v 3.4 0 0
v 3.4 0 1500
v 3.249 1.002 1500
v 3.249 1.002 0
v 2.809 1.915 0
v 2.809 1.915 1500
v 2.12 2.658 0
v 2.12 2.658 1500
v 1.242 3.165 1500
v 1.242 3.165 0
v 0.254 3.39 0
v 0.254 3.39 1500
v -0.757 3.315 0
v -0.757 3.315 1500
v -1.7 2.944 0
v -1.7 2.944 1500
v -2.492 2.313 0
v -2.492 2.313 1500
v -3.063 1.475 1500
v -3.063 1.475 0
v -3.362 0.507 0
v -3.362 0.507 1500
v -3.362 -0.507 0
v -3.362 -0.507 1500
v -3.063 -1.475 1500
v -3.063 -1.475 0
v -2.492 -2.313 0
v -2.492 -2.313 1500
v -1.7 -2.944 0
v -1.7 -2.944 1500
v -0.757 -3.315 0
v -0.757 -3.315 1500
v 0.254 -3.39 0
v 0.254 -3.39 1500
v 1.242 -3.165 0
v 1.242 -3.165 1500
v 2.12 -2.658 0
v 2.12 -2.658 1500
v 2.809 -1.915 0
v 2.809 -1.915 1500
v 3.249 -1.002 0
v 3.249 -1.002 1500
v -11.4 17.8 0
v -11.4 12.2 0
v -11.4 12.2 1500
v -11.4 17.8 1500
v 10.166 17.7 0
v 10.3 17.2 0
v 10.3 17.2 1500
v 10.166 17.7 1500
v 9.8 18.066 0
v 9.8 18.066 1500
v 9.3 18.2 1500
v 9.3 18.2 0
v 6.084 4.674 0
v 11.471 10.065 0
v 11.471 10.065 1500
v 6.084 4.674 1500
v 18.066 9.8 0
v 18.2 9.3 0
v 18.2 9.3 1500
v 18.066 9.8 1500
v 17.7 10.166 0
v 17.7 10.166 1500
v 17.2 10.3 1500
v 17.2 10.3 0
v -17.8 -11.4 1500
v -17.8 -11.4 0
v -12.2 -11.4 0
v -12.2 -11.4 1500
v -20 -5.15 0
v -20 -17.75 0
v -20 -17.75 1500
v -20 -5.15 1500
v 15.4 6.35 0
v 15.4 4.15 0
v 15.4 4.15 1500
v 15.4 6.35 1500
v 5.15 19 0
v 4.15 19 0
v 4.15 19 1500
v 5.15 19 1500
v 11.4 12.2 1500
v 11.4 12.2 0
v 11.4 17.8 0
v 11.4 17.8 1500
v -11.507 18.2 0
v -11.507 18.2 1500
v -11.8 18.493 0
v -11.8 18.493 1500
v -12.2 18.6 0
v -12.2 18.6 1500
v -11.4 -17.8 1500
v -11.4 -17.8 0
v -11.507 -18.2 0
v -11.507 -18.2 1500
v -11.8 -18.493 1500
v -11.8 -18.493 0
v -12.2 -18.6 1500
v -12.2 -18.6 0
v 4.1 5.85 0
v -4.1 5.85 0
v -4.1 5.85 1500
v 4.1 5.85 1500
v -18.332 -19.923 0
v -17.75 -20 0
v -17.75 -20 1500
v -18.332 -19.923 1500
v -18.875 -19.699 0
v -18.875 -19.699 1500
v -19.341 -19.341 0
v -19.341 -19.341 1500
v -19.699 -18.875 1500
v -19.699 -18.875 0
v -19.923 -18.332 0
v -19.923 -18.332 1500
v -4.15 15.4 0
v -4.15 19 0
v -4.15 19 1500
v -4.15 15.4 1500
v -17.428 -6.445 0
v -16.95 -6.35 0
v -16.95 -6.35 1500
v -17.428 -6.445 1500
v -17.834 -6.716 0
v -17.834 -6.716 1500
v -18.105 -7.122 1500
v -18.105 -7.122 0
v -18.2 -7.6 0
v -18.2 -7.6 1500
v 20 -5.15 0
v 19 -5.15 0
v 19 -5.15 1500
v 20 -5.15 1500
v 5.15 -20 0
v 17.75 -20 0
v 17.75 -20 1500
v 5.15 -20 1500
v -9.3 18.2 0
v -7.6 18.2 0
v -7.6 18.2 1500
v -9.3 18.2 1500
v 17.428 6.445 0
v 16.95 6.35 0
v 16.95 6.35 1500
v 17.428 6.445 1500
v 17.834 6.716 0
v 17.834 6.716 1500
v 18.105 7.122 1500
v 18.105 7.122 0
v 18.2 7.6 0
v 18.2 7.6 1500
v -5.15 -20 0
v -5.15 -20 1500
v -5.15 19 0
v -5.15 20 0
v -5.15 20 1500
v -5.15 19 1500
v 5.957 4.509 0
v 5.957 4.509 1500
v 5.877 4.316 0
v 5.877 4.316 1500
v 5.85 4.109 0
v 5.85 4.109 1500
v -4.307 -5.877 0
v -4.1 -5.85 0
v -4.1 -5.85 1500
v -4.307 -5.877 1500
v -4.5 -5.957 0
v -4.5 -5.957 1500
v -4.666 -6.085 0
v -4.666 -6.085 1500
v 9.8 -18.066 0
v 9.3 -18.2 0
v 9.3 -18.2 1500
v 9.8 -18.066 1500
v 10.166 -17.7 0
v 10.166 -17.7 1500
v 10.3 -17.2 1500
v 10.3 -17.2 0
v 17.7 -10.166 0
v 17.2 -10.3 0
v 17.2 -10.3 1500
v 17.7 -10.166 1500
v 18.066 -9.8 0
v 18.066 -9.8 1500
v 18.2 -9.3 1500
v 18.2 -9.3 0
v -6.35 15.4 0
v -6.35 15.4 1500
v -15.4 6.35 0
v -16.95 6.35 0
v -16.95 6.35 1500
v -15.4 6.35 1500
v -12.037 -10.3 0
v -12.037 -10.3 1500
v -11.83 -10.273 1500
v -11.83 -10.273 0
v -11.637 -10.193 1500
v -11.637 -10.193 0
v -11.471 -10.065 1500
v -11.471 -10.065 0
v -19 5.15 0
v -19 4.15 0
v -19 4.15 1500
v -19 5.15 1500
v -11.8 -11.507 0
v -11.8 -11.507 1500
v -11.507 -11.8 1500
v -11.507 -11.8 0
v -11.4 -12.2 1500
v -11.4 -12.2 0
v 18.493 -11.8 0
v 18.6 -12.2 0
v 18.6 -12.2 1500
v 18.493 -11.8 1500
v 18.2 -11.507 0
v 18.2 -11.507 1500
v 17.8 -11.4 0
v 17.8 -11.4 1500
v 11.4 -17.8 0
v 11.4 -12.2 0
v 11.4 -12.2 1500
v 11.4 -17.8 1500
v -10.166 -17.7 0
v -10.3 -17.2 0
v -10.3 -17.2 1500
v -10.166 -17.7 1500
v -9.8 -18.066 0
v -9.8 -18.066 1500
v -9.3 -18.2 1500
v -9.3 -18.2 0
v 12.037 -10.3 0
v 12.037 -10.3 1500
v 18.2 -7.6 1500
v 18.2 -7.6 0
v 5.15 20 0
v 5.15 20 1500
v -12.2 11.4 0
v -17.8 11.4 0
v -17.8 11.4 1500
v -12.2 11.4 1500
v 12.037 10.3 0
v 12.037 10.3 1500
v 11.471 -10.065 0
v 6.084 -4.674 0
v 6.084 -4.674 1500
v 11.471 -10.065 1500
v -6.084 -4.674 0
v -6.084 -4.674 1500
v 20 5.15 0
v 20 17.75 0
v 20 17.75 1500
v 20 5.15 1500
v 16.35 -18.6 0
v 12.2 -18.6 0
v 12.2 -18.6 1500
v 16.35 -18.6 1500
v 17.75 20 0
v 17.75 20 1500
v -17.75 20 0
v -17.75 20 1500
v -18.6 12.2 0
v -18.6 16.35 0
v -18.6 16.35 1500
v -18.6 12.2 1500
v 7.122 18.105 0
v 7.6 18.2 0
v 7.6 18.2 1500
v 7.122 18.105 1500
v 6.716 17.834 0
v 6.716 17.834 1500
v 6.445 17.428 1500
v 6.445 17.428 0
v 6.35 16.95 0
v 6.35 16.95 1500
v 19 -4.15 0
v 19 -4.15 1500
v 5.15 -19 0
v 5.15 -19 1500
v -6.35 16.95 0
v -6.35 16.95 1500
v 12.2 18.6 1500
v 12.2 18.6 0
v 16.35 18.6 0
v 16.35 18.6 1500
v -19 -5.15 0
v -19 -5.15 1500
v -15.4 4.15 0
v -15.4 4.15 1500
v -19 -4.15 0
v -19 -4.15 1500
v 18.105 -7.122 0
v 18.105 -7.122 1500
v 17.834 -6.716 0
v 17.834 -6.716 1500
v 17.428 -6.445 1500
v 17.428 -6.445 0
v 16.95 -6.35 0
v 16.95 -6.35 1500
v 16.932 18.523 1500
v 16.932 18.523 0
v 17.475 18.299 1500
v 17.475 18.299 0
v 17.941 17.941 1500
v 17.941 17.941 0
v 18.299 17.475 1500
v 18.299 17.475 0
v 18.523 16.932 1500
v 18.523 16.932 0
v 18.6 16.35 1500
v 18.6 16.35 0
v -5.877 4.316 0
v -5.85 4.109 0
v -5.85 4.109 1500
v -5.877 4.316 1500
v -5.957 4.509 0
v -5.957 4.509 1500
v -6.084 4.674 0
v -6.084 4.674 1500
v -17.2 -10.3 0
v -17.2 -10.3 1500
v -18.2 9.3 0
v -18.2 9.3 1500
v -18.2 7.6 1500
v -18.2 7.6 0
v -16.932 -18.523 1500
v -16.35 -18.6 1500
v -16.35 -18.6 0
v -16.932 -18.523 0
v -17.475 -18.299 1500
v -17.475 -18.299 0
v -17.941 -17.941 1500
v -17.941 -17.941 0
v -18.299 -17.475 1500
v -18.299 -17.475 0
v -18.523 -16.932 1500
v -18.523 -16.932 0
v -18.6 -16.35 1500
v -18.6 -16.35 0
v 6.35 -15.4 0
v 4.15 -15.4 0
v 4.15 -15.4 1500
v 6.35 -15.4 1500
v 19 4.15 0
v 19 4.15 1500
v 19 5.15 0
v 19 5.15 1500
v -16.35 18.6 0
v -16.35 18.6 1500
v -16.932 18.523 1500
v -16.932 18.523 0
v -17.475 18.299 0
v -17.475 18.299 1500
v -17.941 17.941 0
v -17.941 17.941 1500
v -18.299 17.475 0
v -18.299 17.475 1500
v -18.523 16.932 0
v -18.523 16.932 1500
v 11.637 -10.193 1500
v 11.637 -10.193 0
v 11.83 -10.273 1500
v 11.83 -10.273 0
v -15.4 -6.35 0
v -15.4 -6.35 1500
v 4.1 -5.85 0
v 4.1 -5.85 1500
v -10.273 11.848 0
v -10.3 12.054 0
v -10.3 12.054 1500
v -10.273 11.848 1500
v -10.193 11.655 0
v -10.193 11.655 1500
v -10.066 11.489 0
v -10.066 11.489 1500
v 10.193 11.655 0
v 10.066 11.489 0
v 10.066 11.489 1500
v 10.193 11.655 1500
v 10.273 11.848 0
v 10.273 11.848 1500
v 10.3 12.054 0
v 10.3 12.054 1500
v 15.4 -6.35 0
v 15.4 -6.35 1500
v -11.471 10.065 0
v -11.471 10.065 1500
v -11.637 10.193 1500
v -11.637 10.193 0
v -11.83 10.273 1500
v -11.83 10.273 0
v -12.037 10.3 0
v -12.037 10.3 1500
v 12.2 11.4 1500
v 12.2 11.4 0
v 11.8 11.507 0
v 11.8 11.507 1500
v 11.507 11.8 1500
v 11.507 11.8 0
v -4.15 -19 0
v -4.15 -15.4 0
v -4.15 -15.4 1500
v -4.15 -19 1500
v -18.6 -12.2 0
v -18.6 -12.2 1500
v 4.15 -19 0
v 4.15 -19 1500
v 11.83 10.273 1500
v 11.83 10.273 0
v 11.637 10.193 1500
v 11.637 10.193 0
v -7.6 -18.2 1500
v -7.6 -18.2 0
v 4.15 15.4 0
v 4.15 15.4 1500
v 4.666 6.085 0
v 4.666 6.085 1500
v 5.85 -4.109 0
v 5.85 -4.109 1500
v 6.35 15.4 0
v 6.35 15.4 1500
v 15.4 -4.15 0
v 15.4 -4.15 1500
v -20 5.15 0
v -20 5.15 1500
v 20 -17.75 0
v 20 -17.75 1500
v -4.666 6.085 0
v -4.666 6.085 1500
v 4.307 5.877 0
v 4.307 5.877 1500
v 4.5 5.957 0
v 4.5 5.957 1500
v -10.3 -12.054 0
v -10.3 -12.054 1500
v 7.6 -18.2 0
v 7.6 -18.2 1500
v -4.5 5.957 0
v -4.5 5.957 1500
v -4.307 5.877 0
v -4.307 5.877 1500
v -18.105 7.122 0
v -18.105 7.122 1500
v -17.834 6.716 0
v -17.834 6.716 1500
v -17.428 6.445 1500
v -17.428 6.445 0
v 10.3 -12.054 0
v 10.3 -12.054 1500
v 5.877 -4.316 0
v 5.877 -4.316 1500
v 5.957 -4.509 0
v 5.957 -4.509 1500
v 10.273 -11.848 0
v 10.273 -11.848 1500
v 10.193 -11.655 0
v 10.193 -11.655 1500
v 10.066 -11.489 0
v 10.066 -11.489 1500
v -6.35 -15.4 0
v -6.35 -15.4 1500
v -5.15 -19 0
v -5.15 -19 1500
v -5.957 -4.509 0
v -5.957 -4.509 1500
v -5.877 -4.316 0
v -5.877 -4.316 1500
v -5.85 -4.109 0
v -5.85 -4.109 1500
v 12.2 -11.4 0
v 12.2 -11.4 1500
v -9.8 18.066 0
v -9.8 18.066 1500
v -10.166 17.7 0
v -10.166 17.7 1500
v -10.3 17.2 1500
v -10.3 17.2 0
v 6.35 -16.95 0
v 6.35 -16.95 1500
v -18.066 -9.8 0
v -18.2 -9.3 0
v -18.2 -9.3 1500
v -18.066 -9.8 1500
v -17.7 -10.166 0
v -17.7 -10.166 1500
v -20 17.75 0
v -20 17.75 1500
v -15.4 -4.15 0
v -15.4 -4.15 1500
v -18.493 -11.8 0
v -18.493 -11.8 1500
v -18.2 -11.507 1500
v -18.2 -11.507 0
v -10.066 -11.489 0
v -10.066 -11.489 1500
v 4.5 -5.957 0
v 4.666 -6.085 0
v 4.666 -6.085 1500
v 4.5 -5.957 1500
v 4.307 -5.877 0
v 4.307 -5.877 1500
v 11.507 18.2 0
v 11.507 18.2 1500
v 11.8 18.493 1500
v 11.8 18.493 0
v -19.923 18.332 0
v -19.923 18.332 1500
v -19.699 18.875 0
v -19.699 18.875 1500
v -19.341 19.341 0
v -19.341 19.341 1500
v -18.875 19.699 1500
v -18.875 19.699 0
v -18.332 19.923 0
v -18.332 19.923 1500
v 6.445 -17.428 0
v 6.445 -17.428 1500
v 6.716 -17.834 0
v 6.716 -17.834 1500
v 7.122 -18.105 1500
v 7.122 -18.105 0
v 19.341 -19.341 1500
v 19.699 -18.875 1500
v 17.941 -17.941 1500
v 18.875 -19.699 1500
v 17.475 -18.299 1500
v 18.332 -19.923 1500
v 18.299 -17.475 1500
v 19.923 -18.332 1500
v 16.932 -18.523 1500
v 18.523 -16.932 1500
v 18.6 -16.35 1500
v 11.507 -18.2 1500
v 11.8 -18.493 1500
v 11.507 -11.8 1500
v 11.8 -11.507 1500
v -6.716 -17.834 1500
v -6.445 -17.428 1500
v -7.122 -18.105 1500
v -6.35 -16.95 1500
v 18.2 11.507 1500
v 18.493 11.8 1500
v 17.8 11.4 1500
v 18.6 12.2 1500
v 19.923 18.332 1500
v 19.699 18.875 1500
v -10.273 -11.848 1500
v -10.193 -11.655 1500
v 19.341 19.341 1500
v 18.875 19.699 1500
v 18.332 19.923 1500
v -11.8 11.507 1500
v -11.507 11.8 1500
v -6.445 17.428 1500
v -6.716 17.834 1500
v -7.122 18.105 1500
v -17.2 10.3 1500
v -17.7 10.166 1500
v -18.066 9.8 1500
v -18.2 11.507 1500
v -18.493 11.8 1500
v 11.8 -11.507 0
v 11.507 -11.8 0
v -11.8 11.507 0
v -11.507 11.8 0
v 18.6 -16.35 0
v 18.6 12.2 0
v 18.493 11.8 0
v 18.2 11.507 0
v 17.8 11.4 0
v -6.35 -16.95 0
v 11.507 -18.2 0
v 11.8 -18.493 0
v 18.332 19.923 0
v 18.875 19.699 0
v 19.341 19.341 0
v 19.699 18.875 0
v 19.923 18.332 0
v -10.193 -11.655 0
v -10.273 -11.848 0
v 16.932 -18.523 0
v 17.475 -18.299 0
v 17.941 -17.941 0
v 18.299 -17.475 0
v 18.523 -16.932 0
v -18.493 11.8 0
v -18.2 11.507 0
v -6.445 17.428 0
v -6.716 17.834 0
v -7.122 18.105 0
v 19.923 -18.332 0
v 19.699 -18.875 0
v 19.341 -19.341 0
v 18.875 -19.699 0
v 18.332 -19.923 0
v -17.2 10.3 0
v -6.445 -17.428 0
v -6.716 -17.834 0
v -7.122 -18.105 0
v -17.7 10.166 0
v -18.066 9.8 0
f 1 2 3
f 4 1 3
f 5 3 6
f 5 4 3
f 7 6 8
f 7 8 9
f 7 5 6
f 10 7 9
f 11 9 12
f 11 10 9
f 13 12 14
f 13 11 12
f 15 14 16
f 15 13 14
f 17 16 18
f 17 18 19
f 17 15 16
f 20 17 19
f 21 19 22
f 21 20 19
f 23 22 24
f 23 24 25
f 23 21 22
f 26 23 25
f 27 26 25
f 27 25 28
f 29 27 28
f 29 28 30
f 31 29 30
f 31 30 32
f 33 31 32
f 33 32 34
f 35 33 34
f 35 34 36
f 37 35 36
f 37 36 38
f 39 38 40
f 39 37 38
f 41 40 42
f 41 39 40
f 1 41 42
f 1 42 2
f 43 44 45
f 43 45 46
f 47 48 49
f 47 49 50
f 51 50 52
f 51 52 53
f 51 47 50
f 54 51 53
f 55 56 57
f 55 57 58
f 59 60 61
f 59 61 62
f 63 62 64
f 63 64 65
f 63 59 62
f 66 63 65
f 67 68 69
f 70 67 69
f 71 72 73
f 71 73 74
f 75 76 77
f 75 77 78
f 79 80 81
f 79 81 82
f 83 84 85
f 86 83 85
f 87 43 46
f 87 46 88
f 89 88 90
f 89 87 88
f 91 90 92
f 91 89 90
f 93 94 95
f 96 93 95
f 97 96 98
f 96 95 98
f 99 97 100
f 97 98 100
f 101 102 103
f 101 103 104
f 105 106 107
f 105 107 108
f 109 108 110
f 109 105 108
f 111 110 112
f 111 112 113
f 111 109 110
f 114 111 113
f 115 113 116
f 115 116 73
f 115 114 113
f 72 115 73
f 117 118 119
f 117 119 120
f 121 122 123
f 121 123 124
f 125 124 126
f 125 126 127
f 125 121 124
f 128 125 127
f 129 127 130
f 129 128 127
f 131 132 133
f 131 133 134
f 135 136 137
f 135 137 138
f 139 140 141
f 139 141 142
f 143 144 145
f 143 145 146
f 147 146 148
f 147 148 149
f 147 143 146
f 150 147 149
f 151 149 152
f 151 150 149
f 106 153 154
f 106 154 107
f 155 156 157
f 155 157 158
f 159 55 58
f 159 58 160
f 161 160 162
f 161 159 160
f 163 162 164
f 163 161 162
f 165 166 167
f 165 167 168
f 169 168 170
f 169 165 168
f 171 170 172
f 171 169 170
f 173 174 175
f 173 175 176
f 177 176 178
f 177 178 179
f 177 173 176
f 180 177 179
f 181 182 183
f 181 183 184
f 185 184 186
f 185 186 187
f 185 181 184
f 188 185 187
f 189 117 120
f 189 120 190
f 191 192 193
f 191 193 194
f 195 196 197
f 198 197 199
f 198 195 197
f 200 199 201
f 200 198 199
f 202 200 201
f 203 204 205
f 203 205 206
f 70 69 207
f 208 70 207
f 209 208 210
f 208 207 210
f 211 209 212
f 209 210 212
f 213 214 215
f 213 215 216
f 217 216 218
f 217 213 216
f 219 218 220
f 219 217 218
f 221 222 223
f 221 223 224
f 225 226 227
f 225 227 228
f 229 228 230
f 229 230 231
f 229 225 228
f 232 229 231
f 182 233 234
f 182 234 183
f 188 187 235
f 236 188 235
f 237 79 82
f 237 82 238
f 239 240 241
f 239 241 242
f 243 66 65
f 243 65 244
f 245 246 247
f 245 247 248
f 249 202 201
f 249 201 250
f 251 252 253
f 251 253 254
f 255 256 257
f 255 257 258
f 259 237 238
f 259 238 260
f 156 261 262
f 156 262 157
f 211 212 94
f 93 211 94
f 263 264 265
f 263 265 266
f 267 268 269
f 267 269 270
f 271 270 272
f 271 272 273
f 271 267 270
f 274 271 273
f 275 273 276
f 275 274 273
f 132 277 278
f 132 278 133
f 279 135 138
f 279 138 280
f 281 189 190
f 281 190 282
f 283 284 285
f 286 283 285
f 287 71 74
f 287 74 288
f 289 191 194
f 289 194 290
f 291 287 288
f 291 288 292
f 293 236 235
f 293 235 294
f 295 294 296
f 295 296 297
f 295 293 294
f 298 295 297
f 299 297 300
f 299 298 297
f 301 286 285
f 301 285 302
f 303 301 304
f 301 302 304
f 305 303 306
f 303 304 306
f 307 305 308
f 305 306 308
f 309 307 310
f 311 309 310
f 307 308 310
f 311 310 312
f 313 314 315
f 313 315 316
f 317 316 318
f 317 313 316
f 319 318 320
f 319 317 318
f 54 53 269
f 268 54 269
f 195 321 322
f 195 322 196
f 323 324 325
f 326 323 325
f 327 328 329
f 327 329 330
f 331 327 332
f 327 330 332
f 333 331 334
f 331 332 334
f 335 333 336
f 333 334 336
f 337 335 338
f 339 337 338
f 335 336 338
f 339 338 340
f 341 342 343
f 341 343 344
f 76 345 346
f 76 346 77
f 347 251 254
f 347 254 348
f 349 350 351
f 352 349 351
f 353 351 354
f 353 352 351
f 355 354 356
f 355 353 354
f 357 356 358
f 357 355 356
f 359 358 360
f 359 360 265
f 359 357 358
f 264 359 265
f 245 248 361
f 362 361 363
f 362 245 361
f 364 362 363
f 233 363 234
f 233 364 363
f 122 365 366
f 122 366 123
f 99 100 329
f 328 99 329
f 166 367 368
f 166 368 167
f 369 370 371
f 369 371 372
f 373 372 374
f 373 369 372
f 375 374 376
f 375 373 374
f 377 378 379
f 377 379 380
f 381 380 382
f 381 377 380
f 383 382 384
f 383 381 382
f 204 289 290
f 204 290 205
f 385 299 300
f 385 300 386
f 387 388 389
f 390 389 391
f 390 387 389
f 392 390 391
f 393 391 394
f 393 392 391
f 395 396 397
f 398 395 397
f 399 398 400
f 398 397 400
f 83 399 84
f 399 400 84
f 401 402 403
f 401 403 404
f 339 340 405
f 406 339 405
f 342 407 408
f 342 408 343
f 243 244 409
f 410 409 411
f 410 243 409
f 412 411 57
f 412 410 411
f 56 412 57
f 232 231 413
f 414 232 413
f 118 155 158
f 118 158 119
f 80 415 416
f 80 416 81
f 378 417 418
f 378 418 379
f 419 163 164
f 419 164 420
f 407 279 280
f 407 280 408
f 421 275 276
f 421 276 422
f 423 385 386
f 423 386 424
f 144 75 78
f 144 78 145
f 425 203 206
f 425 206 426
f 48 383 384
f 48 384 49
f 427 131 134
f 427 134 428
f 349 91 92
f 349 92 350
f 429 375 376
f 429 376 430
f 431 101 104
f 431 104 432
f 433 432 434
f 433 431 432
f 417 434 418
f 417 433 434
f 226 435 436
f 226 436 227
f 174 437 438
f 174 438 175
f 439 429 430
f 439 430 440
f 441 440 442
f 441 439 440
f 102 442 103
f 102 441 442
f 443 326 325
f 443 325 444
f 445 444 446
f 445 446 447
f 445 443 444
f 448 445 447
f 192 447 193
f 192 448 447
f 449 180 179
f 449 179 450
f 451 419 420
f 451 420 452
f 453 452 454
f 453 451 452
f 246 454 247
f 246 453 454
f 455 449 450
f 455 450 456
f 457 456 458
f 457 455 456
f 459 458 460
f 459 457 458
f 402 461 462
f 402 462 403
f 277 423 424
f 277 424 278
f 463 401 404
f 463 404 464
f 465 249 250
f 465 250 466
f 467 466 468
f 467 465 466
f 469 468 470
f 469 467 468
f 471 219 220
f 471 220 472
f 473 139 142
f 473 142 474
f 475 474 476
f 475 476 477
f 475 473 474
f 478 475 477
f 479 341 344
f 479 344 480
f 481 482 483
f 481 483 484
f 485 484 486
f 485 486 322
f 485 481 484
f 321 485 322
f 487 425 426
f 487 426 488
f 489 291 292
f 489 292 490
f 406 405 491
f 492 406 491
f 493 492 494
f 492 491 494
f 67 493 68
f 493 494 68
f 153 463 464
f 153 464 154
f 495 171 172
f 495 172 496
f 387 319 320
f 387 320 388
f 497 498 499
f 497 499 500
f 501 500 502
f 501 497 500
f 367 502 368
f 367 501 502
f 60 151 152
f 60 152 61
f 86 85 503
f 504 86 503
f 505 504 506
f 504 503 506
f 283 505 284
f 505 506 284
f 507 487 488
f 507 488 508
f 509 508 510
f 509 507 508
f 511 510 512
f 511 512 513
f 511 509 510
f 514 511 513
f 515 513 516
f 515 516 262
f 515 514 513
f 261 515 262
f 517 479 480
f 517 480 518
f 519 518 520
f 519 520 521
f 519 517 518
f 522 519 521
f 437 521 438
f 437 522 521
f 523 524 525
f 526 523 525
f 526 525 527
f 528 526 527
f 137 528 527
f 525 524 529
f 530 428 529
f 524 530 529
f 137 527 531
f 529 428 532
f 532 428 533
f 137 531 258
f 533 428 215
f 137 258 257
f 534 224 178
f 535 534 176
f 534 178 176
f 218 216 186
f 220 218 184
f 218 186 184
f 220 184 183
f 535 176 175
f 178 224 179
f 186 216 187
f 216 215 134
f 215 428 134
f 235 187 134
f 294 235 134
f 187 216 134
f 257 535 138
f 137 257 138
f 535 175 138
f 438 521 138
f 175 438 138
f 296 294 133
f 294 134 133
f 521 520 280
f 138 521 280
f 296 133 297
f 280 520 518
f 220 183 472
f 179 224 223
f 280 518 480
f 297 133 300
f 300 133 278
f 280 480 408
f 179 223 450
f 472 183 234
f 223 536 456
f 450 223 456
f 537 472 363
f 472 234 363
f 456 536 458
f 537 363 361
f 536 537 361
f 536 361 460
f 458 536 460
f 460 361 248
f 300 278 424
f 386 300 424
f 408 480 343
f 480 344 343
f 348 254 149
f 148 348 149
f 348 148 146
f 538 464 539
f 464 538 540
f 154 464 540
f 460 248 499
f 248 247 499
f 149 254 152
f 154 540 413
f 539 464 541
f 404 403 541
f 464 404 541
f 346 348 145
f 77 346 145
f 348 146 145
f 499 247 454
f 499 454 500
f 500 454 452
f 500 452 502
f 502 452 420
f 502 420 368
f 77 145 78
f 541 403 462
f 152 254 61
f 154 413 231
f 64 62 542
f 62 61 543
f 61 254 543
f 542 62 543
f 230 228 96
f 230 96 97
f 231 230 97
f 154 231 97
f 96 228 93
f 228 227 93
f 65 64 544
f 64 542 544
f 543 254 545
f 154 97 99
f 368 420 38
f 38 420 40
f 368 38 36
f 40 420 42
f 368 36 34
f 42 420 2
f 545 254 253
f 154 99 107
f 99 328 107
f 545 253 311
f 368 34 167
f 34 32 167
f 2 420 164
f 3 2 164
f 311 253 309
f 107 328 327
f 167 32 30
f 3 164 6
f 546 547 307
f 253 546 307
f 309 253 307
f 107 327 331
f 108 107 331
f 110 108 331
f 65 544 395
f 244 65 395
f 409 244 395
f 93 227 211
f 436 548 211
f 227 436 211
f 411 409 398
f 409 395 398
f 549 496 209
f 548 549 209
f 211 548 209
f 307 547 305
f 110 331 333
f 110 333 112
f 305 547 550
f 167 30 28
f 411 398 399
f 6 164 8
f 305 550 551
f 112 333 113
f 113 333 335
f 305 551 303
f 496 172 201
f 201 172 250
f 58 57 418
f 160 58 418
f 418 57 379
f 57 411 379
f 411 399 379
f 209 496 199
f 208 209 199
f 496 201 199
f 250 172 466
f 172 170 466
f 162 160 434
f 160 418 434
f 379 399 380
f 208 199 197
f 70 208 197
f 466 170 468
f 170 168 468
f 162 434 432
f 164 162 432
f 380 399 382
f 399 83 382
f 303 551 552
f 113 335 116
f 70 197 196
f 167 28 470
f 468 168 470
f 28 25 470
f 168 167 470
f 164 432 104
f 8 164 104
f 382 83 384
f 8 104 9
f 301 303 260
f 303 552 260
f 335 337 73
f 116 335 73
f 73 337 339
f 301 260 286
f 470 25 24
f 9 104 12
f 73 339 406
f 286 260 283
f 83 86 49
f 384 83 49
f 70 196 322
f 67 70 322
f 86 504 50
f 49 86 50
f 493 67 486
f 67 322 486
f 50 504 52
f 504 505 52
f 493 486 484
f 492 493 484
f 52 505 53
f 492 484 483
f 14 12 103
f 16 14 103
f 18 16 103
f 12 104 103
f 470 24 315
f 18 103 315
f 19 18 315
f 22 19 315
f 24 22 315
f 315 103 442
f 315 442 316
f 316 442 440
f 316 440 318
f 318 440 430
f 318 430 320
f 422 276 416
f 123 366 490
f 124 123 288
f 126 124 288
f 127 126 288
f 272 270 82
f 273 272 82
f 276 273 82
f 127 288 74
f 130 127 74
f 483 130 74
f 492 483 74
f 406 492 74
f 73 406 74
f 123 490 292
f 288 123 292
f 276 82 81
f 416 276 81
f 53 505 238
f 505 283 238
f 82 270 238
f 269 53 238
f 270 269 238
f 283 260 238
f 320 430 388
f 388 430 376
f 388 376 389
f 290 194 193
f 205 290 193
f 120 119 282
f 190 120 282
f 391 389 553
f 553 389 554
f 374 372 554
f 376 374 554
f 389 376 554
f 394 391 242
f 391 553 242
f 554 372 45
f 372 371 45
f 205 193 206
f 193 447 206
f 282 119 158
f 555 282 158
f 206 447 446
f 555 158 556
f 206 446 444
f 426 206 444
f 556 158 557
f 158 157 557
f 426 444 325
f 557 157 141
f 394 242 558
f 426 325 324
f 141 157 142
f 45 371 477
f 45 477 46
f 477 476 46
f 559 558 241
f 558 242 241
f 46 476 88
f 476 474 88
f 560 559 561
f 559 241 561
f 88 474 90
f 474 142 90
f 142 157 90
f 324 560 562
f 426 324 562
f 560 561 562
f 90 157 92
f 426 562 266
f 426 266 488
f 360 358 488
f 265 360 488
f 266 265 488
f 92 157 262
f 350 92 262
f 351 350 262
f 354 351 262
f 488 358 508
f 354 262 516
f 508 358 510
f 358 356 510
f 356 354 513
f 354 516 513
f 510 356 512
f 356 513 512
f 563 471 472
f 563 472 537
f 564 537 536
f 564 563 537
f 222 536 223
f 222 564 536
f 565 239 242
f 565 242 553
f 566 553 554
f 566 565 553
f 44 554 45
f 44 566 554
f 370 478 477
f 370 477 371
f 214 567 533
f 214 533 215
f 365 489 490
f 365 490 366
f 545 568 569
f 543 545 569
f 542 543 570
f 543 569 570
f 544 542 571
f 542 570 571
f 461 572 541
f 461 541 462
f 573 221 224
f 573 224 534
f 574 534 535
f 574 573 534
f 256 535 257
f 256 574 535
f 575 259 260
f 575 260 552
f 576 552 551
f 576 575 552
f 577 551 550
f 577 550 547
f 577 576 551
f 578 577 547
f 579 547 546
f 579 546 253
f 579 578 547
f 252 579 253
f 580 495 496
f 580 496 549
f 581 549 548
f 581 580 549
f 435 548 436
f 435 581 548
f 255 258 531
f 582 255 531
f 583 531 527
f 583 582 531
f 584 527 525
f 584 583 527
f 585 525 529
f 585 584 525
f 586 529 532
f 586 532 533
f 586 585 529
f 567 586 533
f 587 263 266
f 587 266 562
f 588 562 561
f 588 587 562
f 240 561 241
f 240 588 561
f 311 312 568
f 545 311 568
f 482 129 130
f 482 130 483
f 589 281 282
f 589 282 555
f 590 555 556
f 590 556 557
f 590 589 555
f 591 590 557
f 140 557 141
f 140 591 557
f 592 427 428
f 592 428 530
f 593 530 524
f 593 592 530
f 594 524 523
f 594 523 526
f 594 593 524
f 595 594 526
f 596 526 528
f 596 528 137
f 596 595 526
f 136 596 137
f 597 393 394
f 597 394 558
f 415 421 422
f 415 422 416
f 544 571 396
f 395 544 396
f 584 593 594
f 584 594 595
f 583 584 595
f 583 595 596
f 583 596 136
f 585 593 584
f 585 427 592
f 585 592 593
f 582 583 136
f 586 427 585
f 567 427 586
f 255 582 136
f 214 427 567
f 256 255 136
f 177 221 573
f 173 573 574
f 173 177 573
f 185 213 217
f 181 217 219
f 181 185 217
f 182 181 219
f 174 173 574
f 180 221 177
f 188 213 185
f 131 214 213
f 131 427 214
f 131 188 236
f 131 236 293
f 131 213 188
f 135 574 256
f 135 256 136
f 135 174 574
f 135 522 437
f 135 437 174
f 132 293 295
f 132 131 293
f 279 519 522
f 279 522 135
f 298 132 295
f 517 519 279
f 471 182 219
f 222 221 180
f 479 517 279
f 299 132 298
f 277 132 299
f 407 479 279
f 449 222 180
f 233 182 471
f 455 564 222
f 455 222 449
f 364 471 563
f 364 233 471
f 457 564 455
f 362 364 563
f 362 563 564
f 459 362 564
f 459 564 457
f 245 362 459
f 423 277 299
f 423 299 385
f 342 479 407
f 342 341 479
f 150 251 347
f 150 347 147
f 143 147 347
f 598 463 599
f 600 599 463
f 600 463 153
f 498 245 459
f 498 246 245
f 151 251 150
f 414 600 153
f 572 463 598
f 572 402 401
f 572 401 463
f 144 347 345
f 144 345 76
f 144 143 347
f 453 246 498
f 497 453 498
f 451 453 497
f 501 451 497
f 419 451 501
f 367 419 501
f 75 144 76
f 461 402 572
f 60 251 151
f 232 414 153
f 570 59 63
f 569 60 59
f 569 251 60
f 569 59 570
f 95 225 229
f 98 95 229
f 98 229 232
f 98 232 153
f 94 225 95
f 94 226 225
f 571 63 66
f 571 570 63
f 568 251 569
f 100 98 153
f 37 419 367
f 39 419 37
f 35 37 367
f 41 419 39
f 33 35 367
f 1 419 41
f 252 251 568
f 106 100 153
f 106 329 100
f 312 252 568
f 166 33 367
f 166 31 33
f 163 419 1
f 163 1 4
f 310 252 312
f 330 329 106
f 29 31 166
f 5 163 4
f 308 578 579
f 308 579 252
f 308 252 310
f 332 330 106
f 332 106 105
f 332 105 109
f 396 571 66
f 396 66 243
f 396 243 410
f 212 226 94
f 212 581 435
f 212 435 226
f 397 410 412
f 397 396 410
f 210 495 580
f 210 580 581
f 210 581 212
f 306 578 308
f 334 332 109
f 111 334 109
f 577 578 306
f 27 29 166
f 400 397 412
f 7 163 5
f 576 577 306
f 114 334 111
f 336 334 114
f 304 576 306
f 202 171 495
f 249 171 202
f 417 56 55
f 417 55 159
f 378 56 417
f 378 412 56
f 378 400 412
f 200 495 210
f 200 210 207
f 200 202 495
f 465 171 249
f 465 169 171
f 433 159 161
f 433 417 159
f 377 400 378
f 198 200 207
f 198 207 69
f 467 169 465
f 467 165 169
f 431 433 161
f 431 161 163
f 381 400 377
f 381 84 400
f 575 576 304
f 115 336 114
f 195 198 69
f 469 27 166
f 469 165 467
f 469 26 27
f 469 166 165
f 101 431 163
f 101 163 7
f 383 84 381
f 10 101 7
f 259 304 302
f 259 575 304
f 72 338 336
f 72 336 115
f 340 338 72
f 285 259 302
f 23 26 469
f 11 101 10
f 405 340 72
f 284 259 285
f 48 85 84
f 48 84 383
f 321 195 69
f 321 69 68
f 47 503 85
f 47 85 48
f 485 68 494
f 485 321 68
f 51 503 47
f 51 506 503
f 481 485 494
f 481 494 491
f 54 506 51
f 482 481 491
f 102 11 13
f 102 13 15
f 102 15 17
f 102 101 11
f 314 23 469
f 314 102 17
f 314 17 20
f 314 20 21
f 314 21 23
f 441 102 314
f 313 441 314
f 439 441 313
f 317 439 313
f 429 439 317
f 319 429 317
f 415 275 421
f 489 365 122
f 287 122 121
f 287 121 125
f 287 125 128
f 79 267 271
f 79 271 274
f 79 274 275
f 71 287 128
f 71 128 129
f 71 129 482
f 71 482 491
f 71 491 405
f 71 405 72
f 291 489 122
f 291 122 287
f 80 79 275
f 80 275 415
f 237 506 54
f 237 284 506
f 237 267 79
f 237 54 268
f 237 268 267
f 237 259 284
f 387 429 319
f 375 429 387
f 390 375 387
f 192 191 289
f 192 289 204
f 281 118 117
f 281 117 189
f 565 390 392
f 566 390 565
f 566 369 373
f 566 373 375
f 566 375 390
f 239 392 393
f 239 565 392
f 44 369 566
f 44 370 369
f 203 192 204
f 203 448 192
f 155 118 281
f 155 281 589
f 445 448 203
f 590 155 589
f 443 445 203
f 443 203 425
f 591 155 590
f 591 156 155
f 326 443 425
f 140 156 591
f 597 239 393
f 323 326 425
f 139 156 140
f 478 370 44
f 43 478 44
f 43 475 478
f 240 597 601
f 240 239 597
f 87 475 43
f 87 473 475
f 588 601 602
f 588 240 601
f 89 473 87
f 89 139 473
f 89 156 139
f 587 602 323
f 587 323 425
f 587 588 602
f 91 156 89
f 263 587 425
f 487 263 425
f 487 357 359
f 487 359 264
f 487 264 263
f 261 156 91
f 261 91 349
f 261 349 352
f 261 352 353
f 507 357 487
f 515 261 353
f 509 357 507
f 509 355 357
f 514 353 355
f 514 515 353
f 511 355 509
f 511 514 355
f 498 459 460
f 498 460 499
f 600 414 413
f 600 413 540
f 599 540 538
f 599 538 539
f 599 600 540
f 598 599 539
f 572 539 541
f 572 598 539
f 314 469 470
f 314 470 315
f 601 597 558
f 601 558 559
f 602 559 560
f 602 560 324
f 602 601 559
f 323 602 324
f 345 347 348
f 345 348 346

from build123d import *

# Parameters (mm, degrees)
SKETCH1_R           = 3.4
BOSS_EXTRUDE1_DEPTH = 1500


with BuildPart() as part:
    # Sketch1 → Boss-Extrude1 (new body)
    with BuildSketch(Plane.XY):
        with BuildLine():
            Line((20, 17.75), (20, 5.15))
            Line((20, 5.15), (19, 5.15))
            Line((19, 5.15), (19, 4.15))
            Line((19, 4.15), (15.4, 4.15))
            Line((15.4, 4.15), (15.4, 6.35))
            Line((15.4, 6.35), (16.95, 6.35))
            ThreePointArc((16.95, 6.35), (17.833883476, 6.716116524), (18.2, 7.6))
            Line((18.2, 7.6), (18.2, 9.3))
            ThreePointArc((18.2, 9.3), (17.907106781, 10.007106781), (17.2, 10.3))
            Line((17.2, 10.3), (12.03669957, 10.3))
            ThreePointArc((12.03669957, 10.3), (11.73040037, 10.239040459), (11.470780817, 10.065452001))
            Line((11.470780817, 10.065452001), (6.084081247, 4.674305984))
            ThreePointArc((6.084081247, 4.674305984), (5.910833239, 4.414848262), (5.85, 4.108853983))
            Line((5.85, 4.108853983), (5.85, -4.108853983))
            ThreePointArc((5.85, -4.108853983), (5.910833239, -4.414848262), (6.084081247, -4.674305984))
            Line((6.084081247, -4.674305984), (11.470780817, -10.065452001))
            ThreePointArc((11.470780817, -10.065452001), (11.73040037, -10.239040459), (12.03669957, -10.3))
            Line((12.03669957, -10.3), (17.2, -10.3))
            ThreePointArc((17.2, -10.3), (17.907106781, -10.007106781), (18.2, -9.3))
            Line((18.2, -9.3), (18.2, -7.6))
            ThreePointArc((18.2, -7.6), (17.833883476, -6.716116524), (16.95, -6.35))
            Line((16.95, -6.35), (15.4, -6.35))
            Line((15.4, -6.35), (15.4, -4.15))
            Line((15.4, -4.15), (19, -4.15))
            Line((19, -4.15), (19, -5.15))
            Line((19, -5.15), (20, -5.15))
            Line((20, -5.15), (20, -17.75))
            ThreePointArc((20, -17.75), (19.340990258, -19.340990258), (17.75, -20))
            Line((17.75, -20), (5.15, -20))
            Line((5.15, -20), (5.15, -19))
            Line((5.15, -19), (4.15, -19))
            Line((4.15, -19), (4.15, -15.4))
            Line((4.15, -15.4), (6.35, -15.4))
            Line((6.35, -15.4), (6.35, -16.95))
            ThreePointArc((6.35, -16.95), (6.716116524, -17.833883476), (7.6, -18.2))
            Line((7.6, -18.2), (9.3, -18.2))
            ThreePointArc((9.3, -18.2), (10.007106781, -17.907106781), (10.3, -17.2))
            Line((10.3, -17.2), (10.3, -12.054477022))
            ThreePointArc((10.3, -12.054477022), (10.239166761, -11.748482743), (10.065918753, -11.489025021))
            Line((10.065918753, -11.489025021), (4.665899173, -6.084547999))
            ThreePointArc((4.665899173, -6.084547999), (4.406279619, -5.910959541), (4.09998042, -5.85))
            Line((4.09998042, -5.85), (-4.09998042, -5.85))
            ThreePointArc((-4.09998042, -5.85), (-4.406279619, -5.910959541), (-4.665899173, -6.084547999))
            Line((-4.665899173, -6.084547999), (-10.065918753, -11.489025021))
            ThreePointArc((-10.065918753, -11.489025021), (-10.239166761, -11.748482743), (-10.3, -12.054477022))
            Line((-10.3, -12.054477022), (-10.3, -17.2))
            ThreePointArc((-10.3, -17.2), (-10.007106781, -17.907106781), (-9.3, -18.2))
            Line((-9.3, -18.2), (-7.6, -18.2))
            ThreePointArc((-7.6, -18.2), (-6.716116524, -17.833883476), (-6.35, -16.95))
            Line((-6.35, -16.95), (-6.35, -15.4))
            Line((-6.35, -15.4), (-4.15, -15.4))
            Line((-4.15, -15.4), (-4.15, -19))
            Line((-4.15, -19), (-5.15, -19))
            Line((-5.15, -19), (-5.15, -20))
            Line((-5.15, -20), (-17.75, -20))
            ThreePointArc((-17.75, -20), (-19.340990258, -19.340990258), (-20, -17.75))
            Line((-20, -17.75), (-20, -5.15))
            Line((-20, -5.15), (-19, -5.15))
            Line((-19, -5.15), (-19, -4.15))
            Line((-19, -4.15), (-15.4, -4.15))
            Line((-15.4, -4.15), (-15.4, -6.35))
            Line((-15.4, -6.35), (-16.95, -6.35))
            ThreePointArc((-16.95, -6.35), (-17.833883476, -6.716116524), (-18.2, -7.6))
            Line((-18.2, -7.6), (-18.2, -9.3))
            ThreePointArc((-18.2, -9.3), (-17.907106781, -10.007106781), (-17.2, -10.3))
            Line((-17.2, -10.3), (-12.03669957, -10.3))
            ThreePointArc((-12.03669957, -10.3), (-11.73040037, -10.239040459), (-11.470780817, -10.065452001))
            Line((-11.470780817, -10.065452001), (-6.084081247, -4.674305984))
            ThreePointArc((-6.084081247, -4.674305984), (-5.910833239, -4.414848262), (-5.85, -4.108853983))
            Line((-5.85, -4.108853983), (-5.85, 4.108853983))
            ThreePointArc((-5.85, 4.108853983), (-5.910833239, 4.414848262), (-6.084081247, 4.674305984))
            Line((-6.084081247, 4.674305984), (-11.470780817, 10.065452001))
            ThreePointArc((-11.470780817, 10.065452001), (-11.73040037, 10.239040459), (-12.03669957, 10.3))
            Line((-12.03669957, 10.3), (-17.2, 10.3))
            ThreePointArc((-17.2, 10.3), (-17.907106781, 10.007106781), (-18.2, 9.3))
            Line((-18.2, 9.3), (-18.2, 7.6))
            ThreePointArc((-18.2, 7.6), (-17.833883476, 6.716116524), (-16.95, 6.35))
            Line((-16.95, 6.35), (-15.4, 6.35))
            Line((-15.4, 6.35), (-15.4, 4.15))
            Line((-15.4, 4.15), (-19, 4.15))
            Line((-19, 4.15), (-19, 5.15))
            Line((-19, 5.15), (-20, 5.15))
            Line((-20, 5.15), (-20, 17.75))
            ThreePointArc((-20, 17.75), (-19.340990258, 19.340990258), (-17.75, 20))
            Line((-17.75, 20), (-5.15, 20))
            Line((-5.15, 20), (-5.15, 19))
            Line((-5.15, 19), (-4.15, 19))
            Line((-4.15, 19), (-4.15, 15.4))
            Line((-4.15, 15.4), (-6.35, 15.4))
            Line((-6.35, 15.4), (-6.35, 16.95))
            ThreePointArc((-6.35, 16.95), (-6.716116524, 17.833883476), (-7.6, 18.2))
            Line((-7.6, 18.2), (-9.3, 18.2))
            ThreePointArc((-9.3, 18.2), (-10.007106781, 17.907106781), (-10.3, 17.2))
            Line((-10.3, 17.2), (-10.3, 12.054477022))
            ThreePointArc((-10.3, 12.054477022), (-10.239166761, 11.748482743), (-10.065918753, 11.489025021))
            Line((-10.065918753, 11.489025021), (-4.665899173, 6.084547999))
            ThreePointArc((-4.665899173, 6.084547999), (-4.406279619, 5.910959541), (-4.09998042, 5.85))
            Line((-4.09998042, 5.85), (4.09998042, 5.85))
            ThreePointArc((4.09998042, 5.85), (4.406279619, 5.910959541), (4.665899173, 6.084547999))
            Line((4.665899173, 6.084547999), (10.065918753, 11.489025021))
            ThreePointArc((10.065918753, 11.489025021), (10.239166761, 11.748482743), (10.3, 12.054477022))
            Line((10.3, 12.054477022), (10.3, 17.2))
            ThreePointArc((10.3, 17.2), (10.007106781, 17.907106781), (9.3, 18.2))
            Line((9.3, 18.2), (7.6, 18.2))
            ThreePointArc((7.6, 18.2), (6.716116524, 17.833883476), (6.35, 16.95))
            Line((6.35, 16.95), (6.35, 15.4))
            Line((6.35, 15.4), (4.15, 15.4))
            Line((4.15, 15.4), (4.15, 19))
            Line((4.15, 19), (5.15, 19))
            Line((5.15, 19), (5.15, 20))
            Line((5.15, 20), (17.75, 20))
            ThreePointArc((17.75, 20), (19.340990258, 19.340990258), (20, 17.75))
        make_face()
        Circle(SKETCH1_R, mode=Mode.SUBTRACT)
        with BuildLine():
            Line((18.6, 16.35), (18.6, 12.2))
            ThreePointArc((18.6, 12.2), (18.365685425, 11.634314575), (17.8, 11.4))
            Line((17.8, 11.4), (12.2, 11.4))
            ThreePointArc((12.2, 11.4), (11.634314575, 11.634314575), (11.4, 12.2))
            Line((11.4, 12.2), (11.4, 17.8))
            ThreePointArc((11.4, 17.8), (11.634314575, 18.365685425), (12.2, 18.6))
            Line((12.2, 18.6), (16.35, 18.6))
            ThreePointArc((16.35, 18.6), (17.940990258, 17.940990258), (18.6, 16.35))
        make_face(mode=Mode.SUBTRACT)
        with BuildLine():
            Line((-12.2, 18.6), (-16.35, 18.6))
            ThreePointArc((-16.35, 18.6), (-17.940990258, 17.940990258), (-18.6, 16.35))
            Line((-18.6, 16.35), (-18.6, 12.2))
            ThreePointArc((-18.6, 12.2), (-18.365685425, 11.634314575), (-17.8, 11.4))
            Line((-17.8, 11.4), (-12.2, 11.4))
            ThreePointArc((-12.2, 11.4), (-11.634314575, 11.634314575), (-11.4, 12.2))
            Line((-11.4, 12.2), (-11.4, 17.8))
            ThreePointArc((-11.4, 17.8), (-11.634314575, 18.365685425), (-12.2, 18.6))
        make_face(mode=Mode.SUBTRACT)
        with BuildLine():
            Line((-18.6, -16.35), (-18.6, -12.2))
            ThreePointArc((-18.6, -12.2), (-18.365685425, -11.634314575), (-17.8, -11.4))
            Line((-17.8, -11.4), (-12.2, -11.4))
            ThreePointArc((-12.2, -11.4), (-11.634314575, -11.634314575), (-11.4, -12.2))
            Line((-11.4, -12.2), (-11.4, -17.8))
            ThreePointArc((-11.4, -17.8), (-11.634314575, -18.365685425), (-12.2, -18.6))
            Line((-12.2, -18.6), (-16.35, -18.6))
            ThreePointArc((-16.35, -18.6), (-17.940990258, -17.940990258), (-18.6, -16.35))
        make_face(mode=Mode.SUBTRACT)
        with BuildLine():
            Line((12.2, -18.6), (16.35, -18.6))
            ThreePointArc((16.35, -18.6), (17.940990258, -17.940990258), (18.6, -16.35))
            Line((18.6, -16.35), (18.6, -12.2))
            ThreePointArc((18.6, -12.2), (18.365685425, -11.634314575), (17.8, -11.4))
            Line((17.8, -11.4), (12.2, -11.4))
            ThreePointArc((12.2, -11.4), (11.634314575, -11.634314575), (11.4, -12.2))
            Line((11.4, -12.2), (11.4, -17.8))
            ThreePointArc((11.4, -17.8), (11.634314575, -18.365685425), (12.2, -18.6))
        make_face(mode=Mode.SUBTRACT)
    extrude(amount=BOSS_EXTRUDE1_DEPTH)


solid = part.part
